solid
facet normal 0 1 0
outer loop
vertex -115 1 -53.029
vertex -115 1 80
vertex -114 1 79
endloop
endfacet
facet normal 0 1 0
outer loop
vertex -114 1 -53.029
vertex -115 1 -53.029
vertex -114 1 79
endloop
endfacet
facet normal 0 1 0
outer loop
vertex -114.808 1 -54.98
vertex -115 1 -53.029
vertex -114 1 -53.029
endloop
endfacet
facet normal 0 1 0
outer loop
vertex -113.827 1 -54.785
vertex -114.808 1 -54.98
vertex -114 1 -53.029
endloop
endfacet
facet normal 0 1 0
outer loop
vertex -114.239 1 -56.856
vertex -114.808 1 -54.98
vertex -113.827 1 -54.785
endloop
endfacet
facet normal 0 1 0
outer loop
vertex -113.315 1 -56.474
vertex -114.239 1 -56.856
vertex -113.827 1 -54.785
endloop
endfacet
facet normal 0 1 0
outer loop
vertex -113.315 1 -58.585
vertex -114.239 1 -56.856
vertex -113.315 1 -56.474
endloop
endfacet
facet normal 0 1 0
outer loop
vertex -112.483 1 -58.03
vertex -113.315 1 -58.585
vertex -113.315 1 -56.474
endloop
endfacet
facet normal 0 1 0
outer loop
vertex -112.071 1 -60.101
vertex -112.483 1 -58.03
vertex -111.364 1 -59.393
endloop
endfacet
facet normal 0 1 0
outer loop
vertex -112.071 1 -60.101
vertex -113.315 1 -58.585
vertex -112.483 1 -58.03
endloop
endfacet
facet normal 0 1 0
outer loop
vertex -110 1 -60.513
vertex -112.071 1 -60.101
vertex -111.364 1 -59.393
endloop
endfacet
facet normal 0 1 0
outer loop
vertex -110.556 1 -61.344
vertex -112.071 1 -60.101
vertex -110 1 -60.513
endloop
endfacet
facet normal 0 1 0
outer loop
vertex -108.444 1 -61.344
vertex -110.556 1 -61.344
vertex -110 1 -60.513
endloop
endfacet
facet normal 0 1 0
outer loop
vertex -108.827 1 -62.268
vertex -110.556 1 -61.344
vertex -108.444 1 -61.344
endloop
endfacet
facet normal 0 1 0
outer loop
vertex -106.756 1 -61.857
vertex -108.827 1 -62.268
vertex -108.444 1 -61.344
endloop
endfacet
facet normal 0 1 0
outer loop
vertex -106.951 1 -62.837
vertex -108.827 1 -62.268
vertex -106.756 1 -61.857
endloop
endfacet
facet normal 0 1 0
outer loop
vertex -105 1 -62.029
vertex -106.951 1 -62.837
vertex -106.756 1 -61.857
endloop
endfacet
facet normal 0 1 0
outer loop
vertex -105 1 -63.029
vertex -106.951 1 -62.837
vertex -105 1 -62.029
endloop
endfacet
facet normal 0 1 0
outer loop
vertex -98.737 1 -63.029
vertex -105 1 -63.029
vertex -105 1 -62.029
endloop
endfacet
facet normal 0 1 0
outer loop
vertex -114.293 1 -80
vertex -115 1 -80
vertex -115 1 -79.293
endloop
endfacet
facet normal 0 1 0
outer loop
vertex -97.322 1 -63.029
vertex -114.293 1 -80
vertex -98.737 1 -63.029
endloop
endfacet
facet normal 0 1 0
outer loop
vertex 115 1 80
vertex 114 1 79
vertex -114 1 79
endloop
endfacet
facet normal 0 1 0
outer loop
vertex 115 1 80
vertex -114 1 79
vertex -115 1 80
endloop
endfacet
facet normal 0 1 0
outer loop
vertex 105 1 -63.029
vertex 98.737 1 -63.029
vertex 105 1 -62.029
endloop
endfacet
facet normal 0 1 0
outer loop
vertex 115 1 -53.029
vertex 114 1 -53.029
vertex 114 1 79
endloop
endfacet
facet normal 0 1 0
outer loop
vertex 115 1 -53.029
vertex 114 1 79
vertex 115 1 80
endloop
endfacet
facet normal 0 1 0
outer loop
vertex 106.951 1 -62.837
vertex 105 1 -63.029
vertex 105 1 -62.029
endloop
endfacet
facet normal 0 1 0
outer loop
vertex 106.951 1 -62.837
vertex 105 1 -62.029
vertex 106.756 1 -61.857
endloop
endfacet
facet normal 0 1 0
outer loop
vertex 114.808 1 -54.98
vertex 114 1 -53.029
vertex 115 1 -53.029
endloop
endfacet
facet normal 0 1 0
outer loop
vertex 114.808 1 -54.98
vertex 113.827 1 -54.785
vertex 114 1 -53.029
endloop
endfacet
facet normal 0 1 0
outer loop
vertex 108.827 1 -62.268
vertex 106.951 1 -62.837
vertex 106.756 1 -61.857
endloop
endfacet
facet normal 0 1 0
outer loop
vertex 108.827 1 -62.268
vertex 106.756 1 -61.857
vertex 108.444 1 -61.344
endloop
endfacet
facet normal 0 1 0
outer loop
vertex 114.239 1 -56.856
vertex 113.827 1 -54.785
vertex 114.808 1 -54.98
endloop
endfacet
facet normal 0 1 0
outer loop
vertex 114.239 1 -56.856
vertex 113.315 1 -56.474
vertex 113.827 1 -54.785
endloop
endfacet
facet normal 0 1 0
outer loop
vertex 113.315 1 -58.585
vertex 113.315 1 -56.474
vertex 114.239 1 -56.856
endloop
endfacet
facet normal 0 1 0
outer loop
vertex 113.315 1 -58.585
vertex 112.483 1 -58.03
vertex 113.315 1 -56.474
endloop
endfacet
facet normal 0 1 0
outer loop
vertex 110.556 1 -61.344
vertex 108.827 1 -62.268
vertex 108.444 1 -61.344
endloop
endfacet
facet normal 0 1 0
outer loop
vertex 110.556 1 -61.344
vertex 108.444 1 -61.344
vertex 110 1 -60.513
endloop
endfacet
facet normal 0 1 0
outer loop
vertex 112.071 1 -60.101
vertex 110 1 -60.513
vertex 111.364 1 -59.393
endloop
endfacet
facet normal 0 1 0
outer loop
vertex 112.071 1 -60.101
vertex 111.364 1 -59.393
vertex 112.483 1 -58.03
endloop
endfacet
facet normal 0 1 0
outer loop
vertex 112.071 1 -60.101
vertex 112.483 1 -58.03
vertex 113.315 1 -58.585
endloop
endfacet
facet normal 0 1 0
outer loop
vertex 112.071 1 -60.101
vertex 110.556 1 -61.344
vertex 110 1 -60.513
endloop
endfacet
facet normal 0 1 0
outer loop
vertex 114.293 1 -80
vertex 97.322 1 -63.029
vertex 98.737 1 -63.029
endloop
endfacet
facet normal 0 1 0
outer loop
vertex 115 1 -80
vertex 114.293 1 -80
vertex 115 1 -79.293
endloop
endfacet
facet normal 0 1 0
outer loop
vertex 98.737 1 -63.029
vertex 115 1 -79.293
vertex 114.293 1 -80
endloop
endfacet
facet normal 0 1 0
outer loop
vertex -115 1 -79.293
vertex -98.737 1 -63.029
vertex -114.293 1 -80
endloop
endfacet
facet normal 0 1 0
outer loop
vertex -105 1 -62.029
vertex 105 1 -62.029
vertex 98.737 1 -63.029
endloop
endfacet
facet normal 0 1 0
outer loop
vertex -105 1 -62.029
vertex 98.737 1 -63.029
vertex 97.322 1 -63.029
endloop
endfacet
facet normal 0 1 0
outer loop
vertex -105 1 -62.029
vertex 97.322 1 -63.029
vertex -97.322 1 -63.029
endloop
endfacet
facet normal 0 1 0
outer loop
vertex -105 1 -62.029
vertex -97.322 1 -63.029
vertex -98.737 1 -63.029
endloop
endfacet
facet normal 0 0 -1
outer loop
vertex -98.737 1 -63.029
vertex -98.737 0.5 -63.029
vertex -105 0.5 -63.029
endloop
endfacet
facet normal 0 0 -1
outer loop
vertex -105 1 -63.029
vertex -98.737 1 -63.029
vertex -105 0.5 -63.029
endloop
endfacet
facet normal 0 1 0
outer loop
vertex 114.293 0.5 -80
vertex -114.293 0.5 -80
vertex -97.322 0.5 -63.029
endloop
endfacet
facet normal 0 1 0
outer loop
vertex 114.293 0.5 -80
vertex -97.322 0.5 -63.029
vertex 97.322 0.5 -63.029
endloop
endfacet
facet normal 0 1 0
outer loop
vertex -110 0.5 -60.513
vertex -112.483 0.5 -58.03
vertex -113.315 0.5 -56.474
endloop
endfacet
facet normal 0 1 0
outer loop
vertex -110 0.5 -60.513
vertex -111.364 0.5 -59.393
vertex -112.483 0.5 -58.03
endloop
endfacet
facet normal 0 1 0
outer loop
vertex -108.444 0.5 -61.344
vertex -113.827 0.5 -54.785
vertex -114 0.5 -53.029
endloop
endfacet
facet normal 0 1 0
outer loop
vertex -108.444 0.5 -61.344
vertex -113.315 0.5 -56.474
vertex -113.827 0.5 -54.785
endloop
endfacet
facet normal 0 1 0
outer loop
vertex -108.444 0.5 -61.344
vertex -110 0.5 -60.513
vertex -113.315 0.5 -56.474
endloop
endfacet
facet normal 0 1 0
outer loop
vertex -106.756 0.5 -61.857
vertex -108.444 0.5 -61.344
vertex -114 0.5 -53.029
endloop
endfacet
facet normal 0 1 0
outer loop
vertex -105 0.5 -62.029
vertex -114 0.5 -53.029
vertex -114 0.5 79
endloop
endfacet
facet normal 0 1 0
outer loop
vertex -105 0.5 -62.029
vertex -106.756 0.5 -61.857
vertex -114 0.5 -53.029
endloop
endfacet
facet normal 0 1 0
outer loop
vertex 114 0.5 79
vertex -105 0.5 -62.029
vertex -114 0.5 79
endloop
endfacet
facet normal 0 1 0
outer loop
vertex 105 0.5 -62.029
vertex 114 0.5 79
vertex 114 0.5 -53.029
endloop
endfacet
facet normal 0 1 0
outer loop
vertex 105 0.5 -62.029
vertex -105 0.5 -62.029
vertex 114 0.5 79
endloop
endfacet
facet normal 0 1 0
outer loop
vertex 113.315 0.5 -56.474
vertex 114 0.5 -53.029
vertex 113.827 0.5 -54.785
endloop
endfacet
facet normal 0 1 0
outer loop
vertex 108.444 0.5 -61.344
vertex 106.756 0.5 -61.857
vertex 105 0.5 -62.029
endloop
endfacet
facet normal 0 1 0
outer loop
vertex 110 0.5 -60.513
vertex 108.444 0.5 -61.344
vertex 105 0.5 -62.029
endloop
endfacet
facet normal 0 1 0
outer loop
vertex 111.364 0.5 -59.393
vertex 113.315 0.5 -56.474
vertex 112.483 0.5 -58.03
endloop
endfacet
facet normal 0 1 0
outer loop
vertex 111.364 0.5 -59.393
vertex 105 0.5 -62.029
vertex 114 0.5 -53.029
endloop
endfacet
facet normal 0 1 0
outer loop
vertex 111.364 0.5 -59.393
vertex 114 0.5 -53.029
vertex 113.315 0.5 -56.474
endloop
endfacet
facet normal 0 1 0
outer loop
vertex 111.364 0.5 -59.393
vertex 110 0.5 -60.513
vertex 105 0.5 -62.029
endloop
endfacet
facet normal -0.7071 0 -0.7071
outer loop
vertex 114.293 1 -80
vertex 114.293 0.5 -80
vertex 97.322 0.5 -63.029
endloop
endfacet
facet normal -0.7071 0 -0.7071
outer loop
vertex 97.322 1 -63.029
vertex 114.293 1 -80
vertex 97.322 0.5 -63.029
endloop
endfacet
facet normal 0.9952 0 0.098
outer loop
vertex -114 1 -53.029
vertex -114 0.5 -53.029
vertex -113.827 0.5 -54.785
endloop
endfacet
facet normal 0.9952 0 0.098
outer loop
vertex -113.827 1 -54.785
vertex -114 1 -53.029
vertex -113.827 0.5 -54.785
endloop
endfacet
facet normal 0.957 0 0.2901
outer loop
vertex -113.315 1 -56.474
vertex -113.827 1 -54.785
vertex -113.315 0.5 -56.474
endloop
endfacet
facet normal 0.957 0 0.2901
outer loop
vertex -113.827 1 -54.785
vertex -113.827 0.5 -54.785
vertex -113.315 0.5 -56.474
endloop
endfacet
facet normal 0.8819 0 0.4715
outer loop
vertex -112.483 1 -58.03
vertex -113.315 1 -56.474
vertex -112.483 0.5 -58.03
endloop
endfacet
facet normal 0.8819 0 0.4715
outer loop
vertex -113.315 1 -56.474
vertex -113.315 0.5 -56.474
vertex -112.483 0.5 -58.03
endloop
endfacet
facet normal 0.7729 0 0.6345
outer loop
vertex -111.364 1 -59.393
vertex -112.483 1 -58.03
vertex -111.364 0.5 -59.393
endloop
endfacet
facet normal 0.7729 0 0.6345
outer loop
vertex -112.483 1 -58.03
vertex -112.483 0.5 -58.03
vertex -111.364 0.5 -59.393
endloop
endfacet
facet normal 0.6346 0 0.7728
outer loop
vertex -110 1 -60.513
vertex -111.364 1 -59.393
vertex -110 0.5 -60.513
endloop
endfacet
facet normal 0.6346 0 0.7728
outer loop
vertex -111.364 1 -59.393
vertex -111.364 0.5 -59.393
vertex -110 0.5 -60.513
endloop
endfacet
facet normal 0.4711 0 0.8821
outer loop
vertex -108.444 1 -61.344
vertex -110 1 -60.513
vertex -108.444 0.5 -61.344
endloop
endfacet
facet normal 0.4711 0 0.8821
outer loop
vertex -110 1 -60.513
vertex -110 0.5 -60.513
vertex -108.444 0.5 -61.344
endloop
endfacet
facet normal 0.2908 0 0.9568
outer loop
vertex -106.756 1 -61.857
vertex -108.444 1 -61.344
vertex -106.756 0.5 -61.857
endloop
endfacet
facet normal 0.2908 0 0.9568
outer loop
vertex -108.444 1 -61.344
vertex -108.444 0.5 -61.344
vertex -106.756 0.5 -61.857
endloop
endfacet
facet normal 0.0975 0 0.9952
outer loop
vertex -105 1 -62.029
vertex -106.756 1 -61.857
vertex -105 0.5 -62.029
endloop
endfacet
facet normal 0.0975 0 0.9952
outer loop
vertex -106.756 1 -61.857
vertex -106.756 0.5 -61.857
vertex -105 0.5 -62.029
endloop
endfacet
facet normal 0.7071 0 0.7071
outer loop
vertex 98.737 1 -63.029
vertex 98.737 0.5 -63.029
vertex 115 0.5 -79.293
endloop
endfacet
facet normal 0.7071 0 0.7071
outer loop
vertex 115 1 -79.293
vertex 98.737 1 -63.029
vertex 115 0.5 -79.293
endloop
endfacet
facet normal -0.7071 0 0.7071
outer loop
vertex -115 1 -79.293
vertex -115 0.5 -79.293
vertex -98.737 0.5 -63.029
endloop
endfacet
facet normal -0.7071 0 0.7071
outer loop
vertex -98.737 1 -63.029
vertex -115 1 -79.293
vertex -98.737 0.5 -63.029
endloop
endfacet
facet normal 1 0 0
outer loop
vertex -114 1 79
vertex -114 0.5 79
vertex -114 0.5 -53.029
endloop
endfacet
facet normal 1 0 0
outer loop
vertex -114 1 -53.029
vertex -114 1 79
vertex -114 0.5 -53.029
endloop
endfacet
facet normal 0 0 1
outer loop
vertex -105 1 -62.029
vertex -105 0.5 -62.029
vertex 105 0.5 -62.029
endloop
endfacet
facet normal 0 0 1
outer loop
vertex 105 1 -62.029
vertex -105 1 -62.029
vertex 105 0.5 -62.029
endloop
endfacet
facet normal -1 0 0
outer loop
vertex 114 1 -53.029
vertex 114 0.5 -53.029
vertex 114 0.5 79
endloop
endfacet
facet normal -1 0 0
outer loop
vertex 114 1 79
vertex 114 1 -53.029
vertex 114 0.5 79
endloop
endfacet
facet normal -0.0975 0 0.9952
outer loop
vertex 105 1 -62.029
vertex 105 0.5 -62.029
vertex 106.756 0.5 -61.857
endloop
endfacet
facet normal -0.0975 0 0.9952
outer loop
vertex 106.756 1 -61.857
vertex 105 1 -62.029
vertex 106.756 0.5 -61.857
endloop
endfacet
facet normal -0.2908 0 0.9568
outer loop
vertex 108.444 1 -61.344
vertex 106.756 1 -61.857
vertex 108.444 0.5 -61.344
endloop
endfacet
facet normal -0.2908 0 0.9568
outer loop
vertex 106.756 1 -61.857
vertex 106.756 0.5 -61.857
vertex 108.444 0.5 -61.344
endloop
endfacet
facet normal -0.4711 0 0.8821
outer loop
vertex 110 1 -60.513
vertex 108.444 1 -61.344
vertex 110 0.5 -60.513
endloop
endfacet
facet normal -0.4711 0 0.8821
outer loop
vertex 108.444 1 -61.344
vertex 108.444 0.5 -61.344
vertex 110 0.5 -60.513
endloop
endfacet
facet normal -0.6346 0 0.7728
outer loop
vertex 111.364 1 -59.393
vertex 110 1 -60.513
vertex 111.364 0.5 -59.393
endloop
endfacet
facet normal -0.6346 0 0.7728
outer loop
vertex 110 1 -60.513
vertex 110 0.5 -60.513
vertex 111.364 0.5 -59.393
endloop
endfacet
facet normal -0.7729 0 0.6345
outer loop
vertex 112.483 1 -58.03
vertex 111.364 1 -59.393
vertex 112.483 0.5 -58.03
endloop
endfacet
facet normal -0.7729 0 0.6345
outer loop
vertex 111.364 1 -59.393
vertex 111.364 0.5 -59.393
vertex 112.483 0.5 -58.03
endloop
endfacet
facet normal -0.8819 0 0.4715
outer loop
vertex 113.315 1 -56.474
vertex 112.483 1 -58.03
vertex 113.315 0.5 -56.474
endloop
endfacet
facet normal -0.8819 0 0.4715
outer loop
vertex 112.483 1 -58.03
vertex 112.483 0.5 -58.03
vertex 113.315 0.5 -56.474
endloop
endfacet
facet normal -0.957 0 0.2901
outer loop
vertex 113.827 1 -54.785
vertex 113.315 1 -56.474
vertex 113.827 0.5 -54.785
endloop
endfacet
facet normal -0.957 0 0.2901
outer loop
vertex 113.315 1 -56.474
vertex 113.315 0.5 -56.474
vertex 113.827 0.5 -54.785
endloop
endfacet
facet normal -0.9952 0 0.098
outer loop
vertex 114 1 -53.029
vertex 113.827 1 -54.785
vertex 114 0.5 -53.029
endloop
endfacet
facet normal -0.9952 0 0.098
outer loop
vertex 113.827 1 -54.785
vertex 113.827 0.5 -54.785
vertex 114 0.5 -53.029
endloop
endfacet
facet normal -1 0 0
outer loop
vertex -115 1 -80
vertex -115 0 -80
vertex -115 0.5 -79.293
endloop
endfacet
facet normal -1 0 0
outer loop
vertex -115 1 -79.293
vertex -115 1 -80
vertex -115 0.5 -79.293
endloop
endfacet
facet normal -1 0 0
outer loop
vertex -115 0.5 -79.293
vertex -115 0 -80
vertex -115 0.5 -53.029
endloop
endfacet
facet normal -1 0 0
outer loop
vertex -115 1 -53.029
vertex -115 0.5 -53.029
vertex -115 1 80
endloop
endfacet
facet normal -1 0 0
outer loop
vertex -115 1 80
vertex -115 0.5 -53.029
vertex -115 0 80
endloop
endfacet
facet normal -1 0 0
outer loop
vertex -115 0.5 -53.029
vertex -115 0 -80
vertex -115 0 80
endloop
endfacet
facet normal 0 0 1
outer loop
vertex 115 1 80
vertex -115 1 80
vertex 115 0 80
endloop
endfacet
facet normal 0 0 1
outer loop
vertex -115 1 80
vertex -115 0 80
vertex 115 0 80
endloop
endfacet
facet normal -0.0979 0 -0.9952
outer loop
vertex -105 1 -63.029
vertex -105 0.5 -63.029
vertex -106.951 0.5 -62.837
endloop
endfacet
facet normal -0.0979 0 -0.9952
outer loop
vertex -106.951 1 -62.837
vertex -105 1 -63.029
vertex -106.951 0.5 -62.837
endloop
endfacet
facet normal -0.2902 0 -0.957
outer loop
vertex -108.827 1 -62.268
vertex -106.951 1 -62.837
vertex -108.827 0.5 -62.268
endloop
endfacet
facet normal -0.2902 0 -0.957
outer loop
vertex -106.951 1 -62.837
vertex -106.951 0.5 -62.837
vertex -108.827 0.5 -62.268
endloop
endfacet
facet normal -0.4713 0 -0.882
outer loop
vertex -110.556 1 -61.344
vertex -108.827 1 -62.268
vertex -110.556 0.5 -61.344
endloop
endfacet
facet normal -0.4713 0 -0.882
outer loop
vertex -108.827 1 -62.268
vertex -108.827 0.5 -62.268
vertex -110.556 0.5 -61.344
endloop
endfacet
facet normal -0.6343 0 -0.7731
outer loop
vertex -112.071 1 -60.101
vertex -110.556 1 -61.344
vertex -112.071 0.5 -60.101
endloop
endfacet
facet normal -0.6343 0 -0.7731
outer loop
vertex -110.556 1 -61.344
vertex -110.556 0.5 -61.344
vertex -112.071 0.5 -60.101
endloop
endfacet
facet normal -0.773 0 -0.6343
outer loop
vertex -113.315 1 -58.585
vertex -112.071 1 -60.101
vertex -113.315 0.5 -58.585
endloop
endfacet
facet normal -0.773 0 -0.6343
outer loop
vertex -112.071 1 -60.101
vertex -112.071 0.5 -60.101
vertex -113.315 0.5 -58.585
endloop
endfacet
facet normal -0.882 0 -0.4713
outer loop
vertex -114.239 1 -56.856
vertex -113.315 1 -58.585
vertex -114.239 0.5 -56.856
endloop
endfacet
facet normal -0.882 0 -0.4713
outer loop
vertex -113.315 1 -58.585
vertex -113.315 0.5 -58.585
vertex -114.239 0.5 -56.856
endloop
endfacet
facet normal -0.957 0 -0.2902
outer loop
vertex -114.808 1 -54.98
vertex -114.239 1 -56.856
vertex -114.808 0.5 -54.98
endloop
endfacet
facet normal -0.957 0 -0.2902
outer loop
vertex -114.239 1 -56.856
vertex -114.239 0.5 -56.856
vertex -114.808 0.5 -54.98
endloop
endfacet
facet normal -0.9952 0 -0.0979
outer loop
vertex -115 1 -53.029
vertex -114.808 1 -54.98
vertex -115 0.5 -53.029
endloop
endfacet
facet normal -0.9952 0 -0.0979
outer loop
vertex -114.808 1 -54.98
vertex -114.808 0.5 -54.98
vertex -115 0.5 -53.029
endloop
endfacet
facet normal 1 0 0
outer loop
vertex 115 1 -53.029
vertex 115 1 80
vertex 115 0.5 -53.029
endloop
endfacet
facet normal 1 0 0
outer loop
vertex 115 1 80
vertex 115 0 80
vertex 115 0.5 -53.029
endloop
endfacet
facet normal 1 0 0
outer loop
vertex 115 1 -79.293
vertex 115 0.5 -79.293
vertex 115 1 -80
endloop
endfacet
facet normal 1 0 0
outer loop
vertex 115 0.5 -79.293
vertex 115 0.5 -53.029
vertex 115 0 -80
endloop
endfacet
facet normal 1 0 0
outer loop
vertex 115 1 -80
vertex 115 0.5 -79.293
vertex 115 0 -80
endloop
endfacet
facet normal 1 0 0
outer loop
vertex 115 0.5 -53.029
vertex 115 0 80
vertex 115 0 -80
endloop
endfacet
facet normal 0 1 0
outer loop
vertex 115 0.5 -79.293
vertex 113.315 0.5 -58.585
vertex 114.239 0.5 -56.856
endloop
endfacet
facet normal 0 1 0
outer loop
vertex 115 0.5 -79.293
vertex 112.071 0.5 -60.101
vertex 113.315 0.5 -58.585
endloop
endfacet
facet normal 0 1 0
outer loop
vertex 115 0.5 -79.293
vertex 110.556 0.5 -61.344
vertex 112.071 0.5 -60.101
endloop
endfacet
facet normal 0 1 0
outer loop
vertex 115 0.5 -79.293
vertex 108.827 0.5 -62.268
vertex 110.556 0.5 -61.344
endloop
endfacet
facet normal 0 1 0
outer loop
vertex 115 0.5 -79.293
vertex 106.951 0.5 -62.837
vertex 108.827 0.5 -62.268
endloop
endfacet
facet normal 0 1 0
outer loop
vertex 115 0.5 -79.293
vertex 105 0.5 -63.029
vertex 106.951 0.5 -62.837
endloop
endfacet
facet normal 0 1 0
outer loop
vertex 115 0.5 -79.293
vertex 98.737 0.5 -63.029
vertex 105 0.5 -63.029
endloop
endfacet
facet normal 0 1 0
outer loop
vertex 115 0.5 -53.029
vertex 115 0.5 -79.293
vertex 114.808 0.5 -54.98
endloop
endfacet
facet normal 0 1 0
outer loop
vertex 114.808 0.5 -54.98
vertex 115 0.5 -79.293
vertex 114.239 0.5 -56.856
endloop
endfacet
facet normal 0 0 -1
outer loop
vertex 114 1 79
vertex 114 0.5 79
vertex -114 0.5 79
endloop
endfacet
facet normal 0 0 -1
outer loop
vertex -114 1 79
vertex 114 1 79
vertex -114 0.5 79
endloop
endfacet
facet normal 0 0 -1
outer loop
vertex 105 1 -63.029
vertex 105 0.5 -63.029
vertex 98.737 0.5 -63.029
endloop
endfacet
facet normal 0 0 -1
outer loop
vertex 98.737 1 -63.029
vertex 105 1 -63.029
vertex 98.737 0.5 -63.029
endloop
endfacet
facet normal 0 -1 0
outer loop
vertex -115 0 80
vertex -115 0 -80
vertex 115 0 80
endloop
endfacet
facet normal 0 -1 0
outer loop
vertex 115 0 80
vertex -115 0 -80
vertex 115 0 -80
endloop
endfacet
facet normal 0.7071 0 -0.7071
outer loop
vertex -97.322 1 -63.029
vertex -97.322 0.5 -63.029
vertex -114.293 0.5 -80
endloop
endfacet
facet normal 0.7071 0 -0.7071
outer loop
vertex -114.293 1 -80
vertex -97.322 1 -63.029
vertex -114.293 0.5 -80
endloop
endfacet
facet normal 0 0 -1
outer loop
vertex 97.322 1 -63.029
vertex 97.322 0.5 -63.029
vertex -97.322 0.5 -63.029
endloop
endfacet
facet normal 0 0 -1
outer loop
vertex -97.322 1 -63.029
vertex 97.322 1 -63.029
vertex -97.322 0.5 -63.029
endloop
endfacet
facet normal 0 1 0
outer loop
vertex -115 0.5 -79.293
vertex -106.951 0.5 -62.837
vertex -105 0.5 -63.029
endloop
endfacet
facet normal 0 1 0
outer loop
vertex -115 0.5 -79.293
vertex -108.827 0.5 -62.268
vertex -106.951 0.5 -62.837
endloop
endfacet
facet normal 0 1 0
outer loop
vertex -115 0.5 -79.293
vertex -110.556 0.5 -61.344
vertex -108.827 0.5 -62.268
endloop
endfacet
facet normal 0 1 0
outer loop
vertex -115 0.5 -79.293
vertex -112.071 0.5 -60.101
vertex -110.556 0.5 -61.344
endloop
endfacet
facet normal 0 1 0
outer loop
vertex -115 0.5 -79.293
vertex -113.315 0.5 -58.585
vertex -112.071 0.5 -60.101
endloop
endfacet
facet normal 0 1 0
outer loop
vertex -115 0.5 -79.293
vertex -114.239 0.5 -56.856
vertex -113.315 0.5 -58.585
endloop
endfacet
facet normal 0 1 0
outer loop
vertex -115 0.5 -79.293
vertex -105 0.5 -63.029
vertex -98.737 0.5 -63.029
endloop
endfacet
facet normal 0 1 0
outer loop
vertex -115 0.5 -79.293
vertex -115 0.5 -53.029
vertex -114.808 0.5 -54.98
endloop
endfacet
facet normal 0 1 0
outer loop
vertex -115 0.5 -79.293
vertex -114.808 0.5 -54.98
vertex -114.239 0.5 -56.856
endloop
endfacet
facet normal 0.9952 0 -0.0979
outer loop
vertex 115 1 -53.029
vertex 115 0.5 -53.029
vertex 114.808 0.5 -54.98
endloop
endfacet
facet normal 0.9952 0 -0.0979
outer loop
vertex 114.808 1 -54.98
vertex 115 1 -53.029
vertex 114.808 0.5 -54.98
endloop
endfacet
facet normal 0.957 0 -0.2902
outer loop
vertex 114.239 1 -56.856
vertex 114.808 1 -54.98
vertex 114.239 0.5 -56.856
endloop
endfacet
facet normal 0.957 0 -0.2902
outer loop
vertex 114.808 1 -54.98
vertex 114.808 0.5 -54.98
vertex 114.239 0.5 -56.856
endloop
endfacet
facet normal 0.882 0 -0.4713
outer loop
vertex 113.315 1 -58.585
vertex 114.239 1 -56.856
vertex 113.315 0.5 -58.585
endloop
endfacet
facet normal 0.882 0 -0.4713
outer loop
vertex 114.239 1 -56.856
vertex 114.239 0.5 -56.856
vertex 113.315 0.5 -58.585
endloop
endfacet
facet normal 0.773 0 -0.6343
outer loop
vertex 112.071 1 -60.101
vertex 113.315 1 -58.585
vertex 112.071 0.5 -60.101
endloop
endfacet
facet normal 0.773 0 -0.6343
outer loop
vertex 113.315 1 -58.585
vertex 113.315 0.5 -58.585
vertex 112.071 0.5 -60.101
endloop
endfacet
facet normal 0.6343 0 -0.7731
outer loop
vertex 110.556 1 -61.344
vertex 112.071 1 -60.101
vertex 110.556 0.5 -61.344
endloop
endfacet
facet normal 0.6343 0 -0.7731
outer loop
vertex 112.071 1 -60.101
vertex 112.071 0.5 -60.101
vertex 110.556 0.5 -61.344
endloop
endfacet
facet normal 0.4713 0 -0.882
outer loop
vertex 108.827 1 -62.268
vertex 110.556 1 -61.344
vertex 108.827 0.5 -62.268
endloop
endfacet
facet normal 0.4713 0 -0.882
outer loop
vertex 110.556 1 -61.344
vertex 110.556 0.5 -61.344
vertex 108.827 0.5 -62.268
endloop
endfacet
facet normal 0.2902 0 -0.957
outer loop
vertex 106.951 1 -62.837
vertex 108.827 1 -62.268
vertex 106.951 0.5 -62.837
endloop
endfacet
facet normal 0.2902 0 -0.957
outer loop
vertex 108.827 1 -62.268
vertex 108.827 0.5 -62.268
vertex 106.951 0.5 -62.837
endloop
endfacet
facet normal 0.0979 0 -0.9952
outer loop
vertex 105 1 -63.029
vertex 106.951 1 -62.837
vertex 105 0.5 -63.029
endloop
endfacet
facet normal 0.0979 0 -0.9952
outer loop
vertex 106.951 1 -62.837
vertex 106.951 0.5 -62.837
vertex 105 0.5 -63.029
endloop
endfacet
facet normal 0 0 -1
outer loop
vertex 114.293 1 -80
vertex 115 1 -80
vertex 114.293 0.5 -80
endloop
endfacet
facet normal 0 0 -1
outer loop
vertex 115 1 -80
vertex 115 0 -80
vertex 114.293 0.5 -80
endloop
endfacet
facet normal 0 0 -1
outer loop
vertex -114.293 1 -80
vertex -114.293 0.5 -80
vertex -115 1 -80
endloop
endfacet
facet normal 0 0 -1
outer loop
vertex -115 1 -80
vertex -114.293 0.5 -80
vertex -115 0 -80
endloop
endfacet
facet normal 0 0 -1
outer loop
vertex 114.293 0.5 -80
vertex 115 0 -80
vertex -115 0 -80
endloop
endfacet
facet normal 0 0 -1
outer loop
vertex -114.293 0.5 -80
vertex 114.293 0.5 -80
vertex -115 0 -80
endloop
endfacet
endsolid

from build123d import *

# Parameters (mm, degrees)
SKETCH1_W           = 230
SKETCH1_H           = 160
BOSS_EXTRUDE1_DEPTH = 0.5
BOSS_EXTRUDE2_DEPTH = 0.5


with BuildPart() as part:
    # Sketch1 → Boss-Extrude1 (new body)
    with BuildSketch(Plane(origin=(0, 0, 0), x_dir=(1, 0, 0), z_dir=(0, 1, 0))):
        Rectangle(SKETCH1_W, SKETCH1_H)
    extrude(amount=BOSS_EXTRUDE1_DEPTH)

    # Sketch2 → Boss-Extrude2 (add)
    with BuildSketch(Plane(origin=(0, 0.5, 0), x_dir=(1, 0, 0), z_dir=(0, 1, 0))):
        with BuildLine():
            Line((-97.32233047, 63.029437252), (-98.736544033, 63.029437252))
            Line((-98.736544033, 63.029437252), (-105, 63.029437252))
            ThreePointArc((-105, 63.029437252), (-112.071067812, 60.100505063), (-115, 53.029437252))
            Line((-115, 53.029437252), (-115, -80))
            Line((-115, -80), (115, -80))
            Line((115, -80), (115, 53.029437252))
            ThreePointArc((115, 53.029437252), (112.071067812, 60.100505063), (105, 63.029437252))
            Line((105, 63.029437252), (98.736544033, 63.029437252))
            Line((98.736544033, 63.029437252), (97.32233047, 63.029437252))
            Line((97.32233047, 63.029437252), (-97.32233047, 63.029437252))
        make_face()
        with BuildLine():
            Line((-105, 62.029437252), (105, 62.029437252))
            ThreePointArc((105, 62.029437252), (111.363961031, 59.393398282), (114, 53.029437252))
            Line((114, 53.029437252), (114, -79))
            Line((114, -79), (-114, -79))
            Line((-114, -79), (-114, 53.029437252))
            ThreePointArc((-114, 53.029437252), (-111.363961031, 59.393398282), (-105, 62.029437252))
        make_face(mode=Mode.SUBTRACT)
        Polygon((-115, 80), (-115, 79.292893219), (-98.736544033, 63.029437252), (-97.32233047, 63.029437252), (-114.292893219, 80), align=None)
        Polygon((114.292893219, 80), (97.32233047, 63.029437252), (98.736544033, 63.029437252), (115, 79.292893219), (115, 80), align=None)
    extrude(amount=BOSS_EXTRUDE2_DEPTH)


solid = part.part
